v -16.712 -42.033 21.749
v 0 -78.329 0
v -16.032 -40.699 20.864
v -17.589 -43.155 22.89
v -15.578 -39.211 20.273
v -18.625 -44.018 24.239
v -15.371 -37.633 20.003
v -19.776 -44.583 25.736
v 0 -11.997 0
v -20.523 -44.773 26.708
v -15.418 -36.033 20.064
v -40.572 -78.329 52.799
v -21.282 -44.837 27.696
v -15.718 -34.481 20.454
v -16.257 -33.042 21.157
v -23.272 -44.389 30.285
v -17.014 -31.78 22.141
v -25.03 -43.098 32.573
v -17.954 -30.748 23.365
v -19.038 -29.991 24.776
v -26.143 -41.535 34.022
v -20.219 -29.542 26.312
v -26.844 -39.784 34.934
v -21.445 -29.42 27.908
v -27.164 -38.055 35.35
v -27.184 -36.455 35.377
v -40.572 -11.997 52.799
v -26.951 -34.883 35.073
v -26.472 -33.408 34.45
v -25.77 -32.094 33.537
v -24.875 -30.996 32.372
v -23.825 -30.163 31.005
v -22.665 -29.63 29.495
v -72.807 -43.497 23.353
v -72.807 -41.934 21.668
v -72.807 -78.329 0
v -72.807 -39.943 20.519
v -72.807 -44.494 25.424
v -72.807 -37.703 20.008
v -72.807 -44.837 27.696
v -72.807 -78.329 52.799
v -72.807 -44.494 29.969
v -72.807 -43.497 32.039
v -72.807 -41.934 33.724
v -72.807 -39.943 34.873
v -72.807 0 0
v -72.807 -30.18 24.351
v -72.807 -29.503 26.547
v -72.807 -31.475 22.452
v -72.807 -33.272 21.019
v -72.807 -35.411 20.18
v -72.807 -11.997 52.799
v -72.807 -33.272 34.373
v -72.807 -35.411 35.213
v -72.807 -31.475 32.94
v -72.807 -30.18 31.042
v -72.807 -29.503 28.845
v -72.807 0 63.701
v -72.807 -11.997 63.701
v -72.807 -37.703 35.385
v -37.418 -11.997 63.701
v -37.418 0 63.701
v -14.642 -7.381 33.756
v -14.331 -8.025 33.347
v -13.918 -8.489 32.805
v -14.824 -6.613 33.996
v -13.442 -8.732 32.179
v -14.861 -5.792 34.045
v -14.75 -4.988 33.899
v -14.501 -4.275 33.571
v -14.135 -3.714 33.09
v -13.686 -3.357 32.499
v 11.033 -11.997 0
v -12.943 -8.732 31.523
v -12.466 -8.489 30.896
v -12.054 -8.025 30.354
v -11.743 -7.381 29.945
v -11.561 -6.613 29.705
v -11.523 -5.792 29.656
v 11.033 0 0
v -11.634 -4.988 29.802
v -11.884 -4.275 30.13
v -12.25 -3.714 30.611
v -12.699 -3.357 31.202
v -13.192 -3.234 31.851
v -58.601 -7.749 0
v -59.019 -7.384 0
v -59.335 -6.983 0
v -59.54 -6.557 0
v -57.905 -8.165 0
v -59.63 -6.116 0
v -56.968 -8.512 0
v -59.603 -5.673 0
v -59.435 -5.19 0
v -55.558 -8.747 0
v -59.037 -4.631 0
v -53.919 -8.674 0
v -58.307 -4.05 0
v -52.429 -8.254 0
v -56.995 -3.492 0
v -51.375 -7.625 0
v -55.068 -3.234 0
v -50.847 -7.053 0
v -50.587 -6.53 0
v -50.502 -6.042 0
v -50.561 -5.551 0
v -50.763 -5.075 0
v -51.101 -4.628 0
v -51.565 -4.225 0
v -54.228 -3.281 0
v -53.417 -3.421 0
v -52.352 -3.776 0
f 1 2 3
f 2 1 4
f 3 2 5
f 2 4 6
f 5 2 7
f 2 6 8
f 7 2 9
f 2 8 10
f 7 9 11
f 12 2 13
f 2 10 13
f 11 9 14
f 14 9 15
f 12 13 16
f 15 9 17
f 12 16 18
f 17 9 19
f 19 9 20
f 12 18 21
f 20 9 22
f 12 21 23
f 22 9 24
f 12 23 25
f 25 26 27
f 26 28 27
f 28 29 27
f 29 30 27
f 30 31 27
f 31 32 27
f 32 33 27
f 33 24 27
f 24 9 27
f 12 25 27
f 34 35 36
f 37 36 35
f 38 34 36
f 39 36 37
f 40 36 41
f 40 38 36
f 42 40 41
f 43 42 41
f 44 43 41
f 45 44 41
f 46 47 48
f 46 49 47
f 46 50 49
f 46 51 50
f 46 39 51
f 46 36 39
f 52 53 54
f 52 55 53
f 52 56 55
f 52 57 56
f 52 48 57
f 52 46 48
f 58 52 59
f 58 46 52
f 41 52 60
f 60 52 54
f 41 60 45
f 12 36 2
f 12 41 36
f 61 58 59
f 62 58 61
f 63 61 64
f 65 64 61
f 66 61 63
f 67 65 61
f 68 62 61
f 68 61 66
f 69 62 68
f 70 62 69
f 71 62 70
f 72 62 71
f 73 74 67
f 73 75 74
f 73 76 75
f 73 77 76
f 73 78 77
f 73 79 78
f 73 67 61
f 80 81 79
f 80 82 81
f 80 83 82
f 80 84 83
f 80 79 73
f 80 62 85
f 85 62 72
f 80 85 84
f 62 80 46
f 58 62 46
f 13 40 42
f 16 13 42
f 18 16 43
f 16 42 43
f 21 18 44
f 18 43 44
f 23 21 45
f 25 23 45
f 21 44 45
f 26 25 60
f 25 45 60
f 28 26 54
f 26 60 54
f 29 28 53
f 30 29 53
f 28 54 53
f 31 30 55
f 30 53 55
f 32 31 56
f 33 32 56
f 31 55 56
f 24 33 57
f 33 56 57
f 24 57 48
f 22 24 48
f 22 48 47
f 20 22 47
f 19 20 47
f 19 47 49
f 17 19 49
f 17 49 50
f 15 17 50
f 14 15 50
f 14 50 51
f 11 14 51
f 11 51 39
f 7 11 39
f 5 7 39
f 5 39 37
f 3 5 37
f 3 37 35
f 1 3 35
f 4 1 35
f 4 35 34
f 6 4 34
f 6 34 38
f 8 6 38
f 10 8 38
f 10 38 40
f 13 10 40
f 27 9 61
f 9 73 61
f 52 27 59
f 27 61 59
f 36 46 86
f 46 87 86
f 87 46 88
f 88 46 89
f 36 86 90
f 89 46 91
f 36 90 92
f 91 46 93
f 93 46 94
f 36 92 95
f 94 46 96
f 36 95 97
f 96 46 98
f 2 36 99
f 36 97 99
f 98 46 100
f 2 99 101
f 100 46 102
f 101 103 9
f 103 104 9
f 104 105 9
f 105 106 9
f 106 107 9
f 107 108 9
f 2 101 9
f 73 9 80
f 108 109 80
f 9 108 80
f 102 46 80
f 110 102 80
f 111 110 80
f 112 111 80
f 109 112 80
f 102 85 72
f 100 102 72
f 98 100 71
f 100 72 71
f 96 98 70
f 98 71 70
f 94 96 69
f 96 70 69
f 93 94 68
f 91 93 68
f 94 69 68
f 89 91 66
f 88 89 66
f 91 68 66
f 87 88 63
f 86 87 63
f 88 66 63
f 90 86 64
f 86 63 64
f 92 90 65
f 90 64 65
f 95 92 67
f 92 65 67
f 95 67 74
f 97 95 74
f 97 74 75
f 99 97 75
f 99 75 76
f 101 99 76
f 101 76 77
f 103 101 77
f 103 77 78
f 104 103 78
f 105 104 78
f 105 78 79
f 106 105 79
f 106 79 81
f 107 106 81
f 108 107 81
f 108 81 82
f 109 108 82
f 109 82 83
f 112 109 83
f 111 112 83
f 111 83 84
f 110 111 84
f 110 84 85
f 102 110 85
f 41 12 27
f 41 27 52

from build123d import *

# Parameters (mm, degrees)
F1_DEPTH = 78.3291
F2_R     = 7.7099954694
F3_DEPTH = 68.99092
F5_DEPTH = 11.99651
F6_R     = 2.7645751725
F7_DEPTH = 66.7321124816


with BuildPart() as f1:
    # F0 (on Front) → F1 (new body)
    with BuildSketch(Plane.XZ):
        Polygon((-72.8069469333, 0), (0, 0), (-40.571808815, 52.7989305556), (-72.8069469333, 52.7989305556), align=None)
    extrude(amount=F1_DEPTH)

    # F2 (on face) → F3 (cut)
    with BuildSketch(Plane(origin=(-72.8069469333, 0, 0), x_dir=(0, -1, 0), z_dir=(-1, 0, 0))):
        with Locations((37.1266901493, 27.6962798089)):
            Circle(F2_R)
    extrude(amount=-F3_DEPTH, mode=Mode.SUBTRACT)

    # F4 (on face) → F5 (join)
    with BuildSketch(Plane(origin=(0, 0, 0), x_dir=(-1, 0, 0), z_dir=(0, 1, 0))):
        Polygon((0, 0), (40.571808815, 52.7989305556), (72.8069469333, 52.7989305556), (72.8069469333, 63.7013316154), (37.4180935323, 63.7013316154), (-11.033478193, 0), align=None)
    extrude(amount=-F5_DEPTH)

    # F6 (on face) → F7 (cut, through all)
    with BuildSketch(Plane(origin=(6.9897594118, 0, 5.3164481949), x_dir=(0, 1, 0), z_dir=(0.7959300347, 0, 0.6053886188))):
        with Locations((-5.998255, 33.3373744617)):
            Circle(F6_R)
    extrude(amount=-F7_DEPTH, mode=Mode.SUBTRACT)


solid = f1.part
